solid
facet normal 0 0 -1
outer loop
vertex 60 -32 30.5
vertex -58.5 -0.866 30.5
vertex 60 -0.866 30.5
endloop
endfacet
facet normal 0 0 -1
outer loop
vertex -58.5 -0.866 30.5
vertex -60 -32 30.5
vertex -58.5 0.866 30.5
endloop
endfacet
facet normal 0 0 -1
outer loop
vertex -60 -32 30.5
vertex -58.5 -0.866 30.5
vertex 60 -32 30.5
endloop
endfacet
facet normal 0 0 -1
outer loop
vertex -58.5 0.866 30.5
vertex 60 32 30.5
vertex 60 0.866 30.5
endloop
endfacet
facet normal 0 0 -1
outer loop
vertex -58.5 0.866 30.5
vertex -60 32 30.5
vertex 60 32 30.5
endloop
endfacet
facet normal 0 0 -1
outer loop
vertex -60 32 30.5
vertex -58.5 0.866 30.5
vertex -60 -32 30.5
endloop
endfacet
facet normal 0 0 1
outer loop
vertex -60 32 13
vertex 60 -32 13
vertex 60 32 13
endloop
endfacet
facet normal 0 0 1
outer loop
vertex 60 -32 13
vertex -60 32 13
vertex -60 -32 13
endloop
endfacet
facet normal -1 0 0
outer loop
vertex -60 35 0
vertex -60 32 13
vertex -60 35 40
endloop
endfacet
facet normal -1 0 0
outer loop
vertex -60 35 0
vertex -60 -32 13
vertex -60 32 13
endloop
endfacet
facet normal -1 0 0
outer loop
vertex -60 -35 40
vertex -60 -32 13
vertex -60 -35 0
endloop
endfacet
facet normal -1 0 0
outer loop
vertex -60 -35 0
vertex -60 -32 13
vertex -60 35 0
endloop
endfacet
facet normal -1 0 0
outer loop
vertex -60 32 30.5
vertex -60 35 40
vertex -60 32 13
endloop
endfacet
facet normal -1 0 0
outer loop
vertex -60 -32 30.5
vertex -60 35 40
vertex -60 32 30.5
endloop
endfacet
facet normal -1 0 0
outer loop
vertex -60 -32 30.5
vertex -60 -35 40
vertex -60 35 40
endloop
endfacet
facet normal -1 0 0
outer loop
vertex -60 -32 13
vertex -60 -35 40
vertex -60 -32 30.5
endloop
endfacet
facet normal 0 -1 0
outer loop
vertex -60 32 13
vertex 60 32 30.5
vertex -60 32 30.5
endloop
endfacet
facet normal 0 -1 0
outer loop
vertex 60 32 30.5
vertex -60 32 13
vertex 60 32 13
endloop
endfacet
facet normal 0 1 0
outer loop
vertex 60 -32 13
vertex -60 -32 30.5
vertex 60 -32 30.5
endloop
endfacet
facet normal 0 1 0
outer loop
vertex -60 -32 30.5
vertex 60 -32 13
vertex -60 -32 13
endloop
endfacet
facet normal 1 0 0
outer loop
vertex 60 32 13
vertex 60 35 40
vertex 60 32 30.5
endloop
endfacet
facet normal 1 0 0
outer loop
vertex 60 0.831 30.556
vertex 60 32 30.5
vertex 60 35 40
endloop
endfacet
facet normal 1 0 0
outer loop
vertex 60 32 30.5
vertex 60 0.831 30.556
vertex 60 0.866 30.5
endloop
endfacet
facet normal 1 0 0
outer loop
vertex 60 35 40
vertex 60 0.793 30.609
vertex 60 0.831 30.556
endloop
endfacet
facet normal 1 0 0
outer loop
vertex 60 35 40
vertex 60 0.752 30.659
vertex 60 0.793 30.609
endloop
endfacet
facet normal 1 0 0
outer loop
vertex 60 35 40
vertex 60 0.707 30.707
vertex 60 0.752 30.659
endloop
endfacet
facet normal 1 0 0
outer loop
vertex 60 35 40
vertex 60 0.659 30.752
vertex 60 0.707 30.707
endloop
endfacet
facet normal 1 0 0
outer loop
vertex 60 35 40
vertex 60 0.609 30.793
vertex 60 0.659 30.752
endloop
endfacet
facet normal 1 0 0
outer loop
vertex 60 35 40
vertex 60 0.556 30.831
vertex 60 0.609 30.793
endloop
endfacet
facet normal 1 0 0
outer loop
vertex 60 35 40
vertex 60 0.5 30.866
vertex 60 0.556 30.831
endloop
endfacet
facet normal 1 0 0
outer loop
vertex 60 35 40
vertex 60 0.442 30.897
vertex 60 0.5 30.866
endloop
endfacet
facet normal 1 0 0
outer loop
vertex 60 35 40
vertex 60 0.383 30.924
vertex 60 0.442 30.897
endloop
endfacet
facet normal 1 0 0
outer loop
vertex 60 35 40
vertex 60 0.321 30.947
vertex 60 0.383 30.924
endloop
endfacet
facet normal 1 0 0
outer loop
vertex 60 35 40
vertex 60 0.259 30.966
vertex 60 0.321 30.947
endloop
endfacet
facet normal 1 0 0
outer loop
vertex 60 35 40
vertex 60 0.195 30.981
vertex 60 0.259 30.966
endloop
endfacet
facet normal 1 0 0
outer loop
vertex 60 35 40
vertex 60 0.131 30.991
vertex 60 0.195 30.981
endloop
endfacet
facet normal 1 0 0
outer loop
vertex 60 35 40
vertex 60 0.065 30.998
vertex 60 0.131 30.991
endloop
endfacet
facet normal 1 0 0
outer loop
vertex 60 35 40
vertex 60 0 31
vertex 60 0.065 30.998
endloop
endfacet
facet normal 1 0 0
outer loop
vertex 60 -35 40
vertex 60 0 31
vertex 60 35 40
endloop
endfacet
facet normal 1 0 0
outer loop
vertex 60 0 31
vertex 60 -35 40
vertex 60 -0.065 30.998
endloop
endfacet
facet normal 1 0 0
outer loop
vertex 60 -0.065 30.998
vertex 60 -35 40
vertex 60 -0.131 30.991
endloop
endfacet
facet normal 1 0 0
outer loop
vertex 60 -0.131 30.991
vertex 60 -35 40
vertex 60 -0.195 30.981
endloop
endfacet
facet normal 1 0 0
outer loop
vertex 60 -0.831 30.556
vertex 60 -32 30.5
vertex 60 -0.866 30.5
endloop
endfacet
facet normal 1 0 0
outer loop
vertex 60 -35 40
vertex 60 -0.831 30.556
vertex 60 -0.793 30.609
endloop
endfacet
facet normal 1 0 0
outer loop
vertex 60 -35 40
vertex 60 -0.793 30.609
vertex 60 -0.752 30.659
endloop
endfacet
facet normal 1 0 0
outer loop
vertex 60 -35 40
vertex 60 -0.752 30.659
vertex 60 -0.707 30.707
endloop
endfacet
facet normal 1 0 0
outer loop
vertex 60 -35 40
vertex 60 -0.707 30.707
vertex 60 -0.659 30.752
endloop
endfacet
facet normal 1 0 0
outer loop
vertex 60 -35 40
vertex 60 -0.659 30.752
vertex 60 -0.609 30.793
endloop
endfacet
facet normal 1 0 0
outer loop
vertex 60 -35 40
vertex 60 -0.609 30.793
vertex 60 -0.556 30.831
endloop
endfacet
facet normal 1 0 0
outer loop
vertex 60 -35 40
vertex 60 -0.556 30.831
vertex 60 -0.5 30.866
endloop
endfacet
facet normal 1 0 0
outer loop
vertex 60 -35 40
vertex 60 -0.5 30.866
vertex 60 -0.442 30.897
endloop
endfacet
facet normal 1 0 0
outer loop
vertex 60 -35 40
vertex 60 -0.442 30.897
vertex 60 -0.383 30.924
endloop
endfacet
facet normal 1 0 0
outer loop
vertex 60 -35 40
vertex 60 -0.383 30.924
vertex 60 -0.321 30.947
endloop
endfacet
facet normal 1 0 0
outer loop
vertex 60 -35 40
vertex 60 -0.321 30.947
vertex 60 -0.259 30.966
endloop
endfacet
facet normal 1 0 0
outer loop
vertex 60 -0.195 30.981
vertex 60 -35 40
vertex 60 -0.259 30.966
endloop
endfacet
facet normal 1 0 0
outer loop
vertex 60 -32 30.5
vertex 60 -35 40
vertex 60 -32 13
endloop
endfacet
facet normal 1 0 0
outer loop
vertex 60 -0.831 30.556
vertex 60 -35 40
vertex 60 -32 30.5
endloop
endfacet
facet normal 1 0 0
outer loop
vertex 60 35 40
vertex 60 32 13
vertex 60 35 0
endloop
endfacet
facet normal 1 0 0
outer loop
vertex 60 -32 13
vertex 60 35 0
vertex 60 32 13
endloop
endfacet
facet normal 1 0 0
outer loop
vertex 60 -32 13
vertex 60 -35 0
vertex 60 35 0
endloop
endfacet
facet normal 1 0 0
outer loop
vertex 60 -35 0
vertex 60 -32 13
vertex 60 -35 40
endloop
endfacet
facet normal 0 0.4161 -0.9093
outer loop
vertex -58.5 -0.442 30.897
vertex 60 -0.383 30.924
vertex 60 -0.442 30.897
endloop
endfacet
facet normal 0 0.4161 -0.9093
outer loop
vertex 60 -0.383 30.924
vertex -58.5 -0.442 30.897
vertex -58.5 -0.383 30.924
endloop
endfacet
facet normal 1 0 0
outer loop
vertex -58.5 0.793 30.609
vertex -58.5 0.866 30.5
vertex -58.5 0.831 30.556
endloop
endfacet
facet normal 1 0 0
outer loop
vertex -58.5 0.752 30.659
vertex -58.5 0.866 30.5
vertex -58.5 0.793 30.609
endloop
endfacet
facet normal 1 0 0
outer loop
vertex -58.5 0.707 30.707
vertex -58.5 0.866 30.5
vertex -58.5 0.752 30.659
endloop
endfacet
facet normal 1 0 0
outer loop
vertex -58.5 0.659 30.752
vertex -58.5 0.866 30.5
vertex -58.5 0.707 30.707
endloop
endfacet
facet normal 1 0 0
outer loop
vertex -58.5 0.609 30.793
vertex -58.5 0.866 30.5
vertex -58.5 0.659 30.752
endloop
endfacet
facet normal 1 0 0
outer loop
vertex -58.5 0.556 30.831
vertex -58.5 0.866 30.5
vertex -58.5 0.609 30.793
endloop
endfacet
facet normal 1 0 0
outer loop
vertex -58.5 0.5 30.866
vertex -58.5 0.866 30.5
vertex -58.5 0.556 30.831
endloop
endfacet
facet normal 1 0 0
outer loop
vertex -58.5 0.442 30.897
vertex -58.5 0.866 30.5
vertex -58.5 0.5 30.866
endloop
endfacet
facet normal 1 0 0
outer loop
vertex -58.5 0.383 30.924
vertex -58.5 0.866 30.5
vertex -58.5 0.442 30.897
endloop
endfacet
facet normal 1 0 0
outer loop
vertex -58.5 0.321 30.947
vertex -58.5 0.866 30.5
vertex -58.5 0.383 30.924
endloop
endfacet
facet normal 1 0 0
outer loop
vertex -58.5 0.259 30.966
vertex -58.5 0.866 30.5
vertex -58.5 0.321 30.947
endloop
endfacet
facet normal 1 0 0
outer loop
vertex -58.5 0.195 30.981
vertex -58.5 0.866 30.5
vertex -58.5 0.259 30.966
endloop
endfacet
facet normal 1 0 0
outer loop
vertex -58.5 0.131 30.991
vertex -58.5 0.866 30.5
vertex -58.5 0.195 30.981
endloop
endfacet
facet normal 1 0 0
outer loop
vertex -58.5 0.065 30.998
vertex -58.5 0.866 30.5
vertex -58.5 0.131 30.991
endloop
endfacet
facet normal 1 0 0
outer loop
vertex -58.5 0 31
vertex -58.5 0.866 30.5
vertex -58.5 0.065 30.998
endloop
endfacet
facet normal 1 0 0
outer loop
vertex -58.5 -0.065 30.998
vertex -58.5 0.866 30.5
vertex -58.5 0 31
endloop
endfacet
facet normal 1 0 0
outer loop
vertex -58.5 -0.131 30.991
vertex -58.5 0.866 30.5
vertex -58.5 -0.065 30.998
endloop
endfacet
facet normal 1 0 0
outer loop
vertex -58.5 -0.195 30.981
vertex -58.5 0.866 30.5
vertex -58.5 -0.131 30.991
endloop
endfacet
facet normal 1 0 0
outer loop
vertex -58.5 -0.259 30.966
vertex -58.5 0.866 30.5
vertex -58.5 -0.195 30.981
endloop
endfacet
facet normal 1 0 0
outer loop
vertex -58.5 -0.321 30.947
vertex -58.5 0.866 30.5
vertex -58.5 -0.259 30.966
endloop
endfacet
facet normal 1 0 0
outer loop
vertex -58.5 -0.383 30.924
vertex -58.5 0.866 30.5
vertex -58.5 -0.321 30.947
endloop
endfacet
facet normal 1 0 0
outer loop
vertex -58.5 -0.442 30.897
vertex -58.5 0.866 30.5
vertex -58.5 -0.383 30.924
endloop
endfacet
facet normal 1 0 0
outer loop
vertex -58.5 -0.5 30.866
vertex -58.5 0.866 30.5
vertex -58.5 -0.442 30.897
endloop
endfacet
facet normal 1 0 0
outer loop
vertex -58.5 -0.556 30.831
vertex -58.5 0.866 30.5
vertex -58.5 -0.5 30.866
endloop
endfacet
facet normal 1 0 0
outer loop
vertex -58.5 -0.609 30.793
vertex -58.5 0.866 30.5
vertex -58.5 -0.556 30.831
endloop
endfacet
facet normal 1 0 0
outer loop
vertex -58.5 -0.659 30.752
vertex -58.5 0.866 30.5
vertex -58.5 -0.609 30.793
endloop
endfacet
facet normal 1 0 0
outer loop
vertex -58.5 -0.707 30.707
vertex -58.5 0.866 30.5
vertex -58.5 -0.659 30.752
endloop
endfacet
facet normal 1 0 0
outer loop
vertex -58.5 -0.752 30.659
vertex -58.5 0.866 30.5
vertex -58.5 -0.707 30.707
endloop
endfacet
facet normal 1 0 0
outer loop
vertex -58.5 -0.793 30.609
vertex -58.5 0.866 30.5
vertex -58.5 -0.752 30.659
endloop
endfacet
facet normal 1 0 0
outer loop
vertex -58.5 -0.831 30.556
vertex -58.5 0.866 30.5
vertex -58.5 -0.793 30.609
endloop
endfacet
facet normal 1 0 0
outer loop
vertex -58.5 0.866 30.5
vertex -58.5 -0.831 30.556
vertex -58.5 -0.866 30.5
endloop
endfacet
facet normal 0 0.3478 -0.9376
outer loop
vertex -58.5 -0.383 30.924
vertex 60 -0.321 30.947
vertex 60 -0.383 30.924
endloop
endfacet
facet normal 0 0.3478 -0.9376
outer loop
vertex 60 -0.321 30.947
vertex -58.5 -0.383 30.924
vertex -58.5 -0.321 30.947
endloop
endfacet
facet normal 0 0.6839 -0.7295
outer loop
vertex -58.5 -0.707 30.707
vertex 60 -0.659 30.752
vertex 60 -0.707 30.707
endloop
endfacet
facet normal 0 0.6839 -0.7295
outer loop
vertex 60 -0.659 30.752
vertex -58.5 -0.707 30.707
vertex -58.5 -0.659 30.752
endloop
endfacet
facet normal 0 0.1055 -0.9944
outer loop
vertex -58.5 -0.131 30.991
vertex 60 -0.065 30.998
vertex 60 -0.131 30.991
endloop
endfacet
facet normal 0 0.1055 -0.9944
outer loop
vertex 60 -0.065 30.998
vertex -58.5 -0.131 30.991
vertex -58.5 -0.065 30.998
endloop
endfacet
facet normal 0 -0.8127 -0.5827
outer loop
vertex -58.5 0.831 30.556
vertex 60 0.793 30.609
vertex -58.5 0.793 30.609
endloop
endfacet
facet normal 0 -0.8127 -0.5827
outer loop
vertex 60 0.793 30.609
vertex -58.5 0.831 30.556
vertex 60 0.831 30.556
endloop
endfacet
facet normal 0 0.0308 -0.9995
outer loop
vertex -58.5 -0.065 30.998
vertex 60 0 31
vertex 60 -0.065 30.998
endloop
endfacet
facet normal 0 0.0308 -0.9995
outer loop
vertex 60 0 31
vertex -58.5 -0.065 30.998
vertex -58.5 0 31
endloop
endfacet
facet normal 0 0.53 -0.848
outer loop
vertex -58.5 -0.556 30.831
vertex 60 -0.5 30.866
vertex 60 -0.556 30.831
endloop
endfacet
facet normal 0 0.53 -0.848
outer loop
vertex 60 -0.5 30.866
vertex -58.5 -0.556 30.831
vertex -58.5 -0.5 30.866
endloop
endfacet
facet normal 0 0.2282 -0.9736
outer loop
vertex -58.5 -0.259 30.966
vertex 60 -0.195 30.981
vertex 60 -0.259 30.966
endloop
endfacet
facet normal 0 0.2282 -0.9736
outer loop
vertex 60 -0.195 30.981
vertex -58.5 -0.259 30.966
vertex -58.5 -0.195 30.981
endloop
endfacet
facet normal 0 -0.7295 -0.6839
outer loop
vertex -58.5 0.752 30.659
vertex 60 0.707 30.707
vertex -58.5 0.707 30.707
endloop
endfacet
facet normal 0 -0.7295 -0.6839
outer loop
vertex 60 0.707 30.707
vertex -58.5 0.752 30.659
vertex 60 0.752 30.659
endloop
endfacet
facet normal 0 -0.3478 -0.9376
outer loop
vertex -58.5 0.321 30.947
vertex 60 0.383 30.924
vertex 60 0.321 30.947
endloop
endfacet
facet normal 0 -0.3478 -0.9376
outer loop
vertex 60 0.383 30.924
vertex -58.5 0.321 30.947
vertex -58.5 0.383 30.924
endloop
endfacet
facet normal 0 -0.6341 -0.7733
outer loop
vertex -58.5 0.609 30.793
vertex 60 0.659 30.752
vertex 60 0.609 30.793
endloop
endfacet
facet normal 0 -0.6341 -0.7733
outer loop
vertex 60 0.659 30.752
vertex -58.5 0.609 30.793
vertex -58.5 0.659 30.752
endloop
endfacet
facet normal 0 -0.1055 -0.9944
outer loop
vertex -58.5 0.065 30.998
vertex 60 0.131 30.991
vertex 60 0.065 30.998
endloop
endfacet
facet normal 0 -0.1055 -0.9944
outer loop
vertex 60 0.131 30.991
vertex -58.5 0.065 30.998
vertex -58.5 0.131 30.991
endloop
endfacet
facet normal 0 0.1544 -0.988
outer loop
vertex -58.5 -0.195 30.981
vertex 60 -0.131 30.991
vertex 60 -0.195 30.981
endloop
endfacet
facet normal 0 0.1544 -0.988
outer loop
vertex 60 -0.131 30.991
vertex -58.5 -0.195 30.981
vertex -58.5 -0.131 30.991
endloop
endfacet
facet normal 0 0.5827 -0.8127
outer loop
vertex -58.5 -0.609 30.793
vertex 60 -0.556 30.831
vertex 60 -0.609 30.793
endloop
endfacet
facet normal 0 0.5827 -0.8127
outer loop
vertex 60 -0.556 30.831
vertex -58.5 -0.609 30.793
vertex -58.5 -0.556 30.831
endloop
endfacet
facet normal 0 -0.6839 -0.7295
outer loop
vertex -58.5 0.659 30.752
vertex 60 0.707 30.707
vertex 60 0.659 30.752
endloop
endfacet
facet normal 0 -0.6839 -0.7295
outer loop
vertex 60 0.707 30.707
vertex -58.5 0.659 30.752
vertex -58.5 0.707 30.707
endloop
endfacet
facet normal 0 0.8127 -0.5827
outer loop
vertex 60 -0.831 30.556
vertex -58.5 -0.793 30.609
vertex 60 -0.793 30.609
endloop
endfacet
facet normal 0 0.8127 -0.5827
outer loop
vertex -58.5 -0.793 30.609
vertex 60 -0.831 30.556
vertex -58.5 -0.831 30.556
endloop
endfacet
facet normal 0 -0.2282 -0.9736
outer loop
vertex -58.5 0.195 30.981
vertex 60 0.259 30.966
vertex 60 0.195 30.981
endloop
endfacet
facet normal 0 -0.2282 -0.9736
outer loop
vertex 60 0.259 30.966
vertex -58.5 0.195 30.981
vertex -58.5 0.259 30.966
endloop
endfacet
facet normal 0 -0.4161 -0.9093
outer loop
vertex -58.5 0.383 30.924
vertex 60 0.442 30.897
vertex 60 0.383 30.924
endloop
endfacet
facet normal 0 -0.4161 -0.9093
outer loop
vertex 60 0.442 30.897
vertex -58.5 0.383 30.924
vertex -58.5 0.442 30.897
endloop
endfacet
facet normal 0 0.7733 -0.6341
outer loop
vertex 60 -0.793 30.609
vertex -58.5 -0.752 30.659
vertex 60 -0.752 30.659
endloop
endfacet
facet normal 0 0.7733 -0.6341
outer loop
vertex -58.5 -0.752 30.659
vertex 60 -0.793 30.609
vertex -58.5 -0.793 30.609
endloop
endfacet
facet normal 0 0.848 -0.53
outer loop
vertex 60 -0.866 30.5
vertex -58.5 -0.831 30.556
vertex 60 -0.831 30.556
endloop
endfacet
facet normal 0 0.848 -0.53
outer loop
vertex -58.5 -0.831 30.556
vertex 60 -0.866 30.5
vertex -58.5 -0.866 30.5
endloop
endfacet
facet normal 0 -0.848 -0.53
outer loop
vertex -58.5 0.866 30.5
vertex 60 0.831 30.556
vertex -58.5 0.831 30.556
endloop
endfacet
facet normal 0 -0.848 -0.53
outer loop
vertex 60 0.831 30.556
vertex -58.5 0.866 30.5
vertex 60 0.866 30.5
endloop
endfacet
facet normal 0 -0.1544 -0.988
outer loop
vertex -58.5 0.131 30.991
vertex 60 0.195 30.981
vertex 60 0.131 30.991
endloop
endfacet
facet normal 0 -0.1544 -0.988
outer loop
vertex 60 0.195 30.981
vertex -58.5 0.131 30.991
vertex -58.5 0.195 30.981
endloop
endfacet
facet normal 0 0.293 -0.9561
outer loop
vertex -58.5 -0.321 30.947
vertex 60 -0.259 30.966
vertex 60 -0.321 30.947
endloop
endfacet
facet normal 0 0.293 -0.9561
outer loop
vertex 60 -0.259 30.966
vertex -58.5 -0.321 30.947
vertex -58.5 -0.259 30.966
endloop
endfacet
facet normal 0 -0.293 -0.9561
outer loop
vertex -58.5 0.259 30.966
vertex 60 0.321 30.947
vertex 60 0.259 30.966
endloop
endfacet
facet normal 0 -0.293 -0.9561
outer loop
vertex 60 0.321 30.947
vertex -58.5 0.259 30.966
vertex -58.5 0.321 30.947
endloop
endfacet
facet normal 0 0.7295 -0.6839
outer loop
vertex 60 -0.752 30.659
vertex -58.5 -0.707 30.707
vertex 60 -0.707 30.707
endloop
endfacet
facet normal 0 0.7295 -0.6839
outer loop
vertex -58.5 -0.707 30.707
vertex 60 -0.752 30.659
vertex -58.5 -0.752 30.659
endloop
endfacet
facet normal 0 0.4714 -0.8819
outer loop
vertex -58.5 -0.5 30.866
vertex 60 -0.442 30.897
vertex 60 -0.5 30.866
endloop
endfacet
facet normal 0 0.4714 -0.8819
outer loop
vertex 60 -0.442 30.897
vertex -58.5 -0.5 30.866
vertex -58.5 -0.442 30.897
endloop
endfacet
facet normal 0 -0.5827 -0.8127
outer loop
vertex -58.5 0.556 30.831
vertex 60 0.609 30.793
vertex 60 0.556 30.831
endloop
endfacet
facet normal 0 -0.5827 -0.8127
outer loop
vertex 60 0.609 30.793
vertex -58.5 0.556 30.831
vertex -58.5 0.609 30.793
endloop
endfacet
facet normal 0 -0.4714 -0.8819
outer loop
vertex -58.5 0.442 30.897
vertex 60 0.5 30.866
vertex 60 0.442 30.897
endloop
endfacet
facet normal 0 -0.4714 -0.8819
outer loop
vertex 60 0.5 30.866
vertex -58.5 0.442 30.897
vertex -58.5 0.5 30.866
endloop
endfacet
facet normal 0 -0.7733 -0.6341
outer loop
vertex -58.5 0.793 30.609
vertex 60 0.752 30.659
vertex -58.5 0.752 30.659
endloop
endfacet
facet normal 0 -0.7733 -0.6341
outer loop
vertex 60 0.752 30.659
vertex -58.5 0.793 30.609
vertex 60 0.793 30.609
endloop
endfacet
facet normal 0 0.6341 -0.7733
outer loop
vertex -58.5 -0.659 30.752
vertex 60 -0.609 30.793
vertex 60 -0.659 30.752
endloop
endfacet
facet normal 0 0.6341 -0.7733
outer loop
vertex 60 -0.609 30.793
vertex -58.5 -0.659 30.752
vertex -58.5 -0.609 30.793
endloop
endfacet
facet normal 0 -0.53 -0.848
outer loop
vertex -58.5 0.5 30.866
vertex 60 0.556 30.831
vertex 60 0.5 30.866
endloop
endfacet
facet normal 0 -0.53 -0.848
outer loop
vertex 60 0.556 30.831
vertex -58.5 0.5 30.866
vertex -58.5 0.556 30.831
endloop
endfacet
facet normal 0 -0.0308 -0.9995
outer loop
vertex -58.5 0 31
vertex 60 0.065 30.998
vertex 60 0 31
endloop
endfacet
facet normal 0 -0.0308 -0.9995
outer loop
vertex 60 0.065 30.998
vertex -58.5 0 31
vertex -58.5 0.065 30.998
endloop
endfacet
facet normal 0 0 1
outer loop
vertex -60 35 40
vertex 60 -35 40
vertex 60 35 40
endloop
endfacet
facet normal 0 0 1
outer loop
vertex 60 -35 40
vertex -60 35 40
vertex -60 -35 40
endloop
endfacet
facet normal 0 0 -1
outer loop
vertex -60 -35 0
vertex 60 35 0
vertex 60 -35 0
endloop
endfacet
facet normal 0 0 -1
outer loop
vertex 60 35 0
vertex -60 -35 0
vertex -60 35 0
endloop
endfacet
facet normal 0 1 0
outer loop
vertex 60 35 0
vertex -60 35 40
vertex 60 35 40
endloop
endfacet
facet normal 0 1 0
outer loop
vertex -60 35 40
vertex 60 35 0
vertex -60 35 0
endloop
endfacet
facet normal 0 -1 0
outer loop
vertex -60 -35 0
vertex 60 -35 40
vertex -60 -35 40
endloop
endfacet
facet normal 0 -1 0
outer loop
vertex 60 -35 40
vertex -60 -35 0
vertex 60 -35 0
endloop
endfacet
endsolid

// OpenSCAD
// Mini horizontal gel-electrophoresis box - buffer tank
// Print orientation: tank rests on XY plane at z = 0, builds upward (+Z)

// ---------------- Parameters ----------------
tank_x      = 120;   // outer length along X (mm)
tank_y      = 70;    // outer width along Y (mm)
tank_h      = 40;    // outer height along Z (mm)
wall        = 3;     // wall thickness (mm)
floor       = 3;     // floor thickness (mm)

platform_x  = 60;    // platform length along X (mm), centred
platform_y  = tank_y - 2 * wall;  // platform spans full inner width (mm)
platform_top = 10;   // platform top height above inner floor (mm) -> z = floor + platform_top

hole_d      = 2;     // electrode hole diameter (mm)
hole_y      = 0;     // electrode hole Y position (mm)
hole_z      = 30;    // electrode hole Z position (mm)

eps         = 0.5;   // cutter overshoot past faces (mm)
$fn         = 96;    // curve resolution

// ---------------- Derived ----------------
inner_floor_z = floor;
platform_z    = inner_floor_z + platform_top;
chamber_h     = hole_z - platform_z;   // height of buffer chambers above platform

// ---------------- Model ----------------
difference() {
    // Tank body: outer block with floor and walls, open top
    translate([-tank_x/2, -tank_y/2, 0])
        cube([tank_x, tank_y, tank_h]);

    // Cut out the two end buffer chambers above the platform
    for (sx = [-1, 1]) {
        translate([sx > 0 ? tank_x/2 - platform_x : -tank_x/2, -platform_y/2, platform_z])
            cube([platform_x, platform_y, chamber_h + eps]);
    }

    // Horizontal electrode holes through each end wall, along X
    for (sx = [-1, 1]) {
        translate([sx * (tank_x/2 - hole_d/2 - eps), hole_y, hole_z])
            rotate([0, 90, 0])
                cylinder(d = hole_d, h = tank_x + 2*eps);
    }
}
